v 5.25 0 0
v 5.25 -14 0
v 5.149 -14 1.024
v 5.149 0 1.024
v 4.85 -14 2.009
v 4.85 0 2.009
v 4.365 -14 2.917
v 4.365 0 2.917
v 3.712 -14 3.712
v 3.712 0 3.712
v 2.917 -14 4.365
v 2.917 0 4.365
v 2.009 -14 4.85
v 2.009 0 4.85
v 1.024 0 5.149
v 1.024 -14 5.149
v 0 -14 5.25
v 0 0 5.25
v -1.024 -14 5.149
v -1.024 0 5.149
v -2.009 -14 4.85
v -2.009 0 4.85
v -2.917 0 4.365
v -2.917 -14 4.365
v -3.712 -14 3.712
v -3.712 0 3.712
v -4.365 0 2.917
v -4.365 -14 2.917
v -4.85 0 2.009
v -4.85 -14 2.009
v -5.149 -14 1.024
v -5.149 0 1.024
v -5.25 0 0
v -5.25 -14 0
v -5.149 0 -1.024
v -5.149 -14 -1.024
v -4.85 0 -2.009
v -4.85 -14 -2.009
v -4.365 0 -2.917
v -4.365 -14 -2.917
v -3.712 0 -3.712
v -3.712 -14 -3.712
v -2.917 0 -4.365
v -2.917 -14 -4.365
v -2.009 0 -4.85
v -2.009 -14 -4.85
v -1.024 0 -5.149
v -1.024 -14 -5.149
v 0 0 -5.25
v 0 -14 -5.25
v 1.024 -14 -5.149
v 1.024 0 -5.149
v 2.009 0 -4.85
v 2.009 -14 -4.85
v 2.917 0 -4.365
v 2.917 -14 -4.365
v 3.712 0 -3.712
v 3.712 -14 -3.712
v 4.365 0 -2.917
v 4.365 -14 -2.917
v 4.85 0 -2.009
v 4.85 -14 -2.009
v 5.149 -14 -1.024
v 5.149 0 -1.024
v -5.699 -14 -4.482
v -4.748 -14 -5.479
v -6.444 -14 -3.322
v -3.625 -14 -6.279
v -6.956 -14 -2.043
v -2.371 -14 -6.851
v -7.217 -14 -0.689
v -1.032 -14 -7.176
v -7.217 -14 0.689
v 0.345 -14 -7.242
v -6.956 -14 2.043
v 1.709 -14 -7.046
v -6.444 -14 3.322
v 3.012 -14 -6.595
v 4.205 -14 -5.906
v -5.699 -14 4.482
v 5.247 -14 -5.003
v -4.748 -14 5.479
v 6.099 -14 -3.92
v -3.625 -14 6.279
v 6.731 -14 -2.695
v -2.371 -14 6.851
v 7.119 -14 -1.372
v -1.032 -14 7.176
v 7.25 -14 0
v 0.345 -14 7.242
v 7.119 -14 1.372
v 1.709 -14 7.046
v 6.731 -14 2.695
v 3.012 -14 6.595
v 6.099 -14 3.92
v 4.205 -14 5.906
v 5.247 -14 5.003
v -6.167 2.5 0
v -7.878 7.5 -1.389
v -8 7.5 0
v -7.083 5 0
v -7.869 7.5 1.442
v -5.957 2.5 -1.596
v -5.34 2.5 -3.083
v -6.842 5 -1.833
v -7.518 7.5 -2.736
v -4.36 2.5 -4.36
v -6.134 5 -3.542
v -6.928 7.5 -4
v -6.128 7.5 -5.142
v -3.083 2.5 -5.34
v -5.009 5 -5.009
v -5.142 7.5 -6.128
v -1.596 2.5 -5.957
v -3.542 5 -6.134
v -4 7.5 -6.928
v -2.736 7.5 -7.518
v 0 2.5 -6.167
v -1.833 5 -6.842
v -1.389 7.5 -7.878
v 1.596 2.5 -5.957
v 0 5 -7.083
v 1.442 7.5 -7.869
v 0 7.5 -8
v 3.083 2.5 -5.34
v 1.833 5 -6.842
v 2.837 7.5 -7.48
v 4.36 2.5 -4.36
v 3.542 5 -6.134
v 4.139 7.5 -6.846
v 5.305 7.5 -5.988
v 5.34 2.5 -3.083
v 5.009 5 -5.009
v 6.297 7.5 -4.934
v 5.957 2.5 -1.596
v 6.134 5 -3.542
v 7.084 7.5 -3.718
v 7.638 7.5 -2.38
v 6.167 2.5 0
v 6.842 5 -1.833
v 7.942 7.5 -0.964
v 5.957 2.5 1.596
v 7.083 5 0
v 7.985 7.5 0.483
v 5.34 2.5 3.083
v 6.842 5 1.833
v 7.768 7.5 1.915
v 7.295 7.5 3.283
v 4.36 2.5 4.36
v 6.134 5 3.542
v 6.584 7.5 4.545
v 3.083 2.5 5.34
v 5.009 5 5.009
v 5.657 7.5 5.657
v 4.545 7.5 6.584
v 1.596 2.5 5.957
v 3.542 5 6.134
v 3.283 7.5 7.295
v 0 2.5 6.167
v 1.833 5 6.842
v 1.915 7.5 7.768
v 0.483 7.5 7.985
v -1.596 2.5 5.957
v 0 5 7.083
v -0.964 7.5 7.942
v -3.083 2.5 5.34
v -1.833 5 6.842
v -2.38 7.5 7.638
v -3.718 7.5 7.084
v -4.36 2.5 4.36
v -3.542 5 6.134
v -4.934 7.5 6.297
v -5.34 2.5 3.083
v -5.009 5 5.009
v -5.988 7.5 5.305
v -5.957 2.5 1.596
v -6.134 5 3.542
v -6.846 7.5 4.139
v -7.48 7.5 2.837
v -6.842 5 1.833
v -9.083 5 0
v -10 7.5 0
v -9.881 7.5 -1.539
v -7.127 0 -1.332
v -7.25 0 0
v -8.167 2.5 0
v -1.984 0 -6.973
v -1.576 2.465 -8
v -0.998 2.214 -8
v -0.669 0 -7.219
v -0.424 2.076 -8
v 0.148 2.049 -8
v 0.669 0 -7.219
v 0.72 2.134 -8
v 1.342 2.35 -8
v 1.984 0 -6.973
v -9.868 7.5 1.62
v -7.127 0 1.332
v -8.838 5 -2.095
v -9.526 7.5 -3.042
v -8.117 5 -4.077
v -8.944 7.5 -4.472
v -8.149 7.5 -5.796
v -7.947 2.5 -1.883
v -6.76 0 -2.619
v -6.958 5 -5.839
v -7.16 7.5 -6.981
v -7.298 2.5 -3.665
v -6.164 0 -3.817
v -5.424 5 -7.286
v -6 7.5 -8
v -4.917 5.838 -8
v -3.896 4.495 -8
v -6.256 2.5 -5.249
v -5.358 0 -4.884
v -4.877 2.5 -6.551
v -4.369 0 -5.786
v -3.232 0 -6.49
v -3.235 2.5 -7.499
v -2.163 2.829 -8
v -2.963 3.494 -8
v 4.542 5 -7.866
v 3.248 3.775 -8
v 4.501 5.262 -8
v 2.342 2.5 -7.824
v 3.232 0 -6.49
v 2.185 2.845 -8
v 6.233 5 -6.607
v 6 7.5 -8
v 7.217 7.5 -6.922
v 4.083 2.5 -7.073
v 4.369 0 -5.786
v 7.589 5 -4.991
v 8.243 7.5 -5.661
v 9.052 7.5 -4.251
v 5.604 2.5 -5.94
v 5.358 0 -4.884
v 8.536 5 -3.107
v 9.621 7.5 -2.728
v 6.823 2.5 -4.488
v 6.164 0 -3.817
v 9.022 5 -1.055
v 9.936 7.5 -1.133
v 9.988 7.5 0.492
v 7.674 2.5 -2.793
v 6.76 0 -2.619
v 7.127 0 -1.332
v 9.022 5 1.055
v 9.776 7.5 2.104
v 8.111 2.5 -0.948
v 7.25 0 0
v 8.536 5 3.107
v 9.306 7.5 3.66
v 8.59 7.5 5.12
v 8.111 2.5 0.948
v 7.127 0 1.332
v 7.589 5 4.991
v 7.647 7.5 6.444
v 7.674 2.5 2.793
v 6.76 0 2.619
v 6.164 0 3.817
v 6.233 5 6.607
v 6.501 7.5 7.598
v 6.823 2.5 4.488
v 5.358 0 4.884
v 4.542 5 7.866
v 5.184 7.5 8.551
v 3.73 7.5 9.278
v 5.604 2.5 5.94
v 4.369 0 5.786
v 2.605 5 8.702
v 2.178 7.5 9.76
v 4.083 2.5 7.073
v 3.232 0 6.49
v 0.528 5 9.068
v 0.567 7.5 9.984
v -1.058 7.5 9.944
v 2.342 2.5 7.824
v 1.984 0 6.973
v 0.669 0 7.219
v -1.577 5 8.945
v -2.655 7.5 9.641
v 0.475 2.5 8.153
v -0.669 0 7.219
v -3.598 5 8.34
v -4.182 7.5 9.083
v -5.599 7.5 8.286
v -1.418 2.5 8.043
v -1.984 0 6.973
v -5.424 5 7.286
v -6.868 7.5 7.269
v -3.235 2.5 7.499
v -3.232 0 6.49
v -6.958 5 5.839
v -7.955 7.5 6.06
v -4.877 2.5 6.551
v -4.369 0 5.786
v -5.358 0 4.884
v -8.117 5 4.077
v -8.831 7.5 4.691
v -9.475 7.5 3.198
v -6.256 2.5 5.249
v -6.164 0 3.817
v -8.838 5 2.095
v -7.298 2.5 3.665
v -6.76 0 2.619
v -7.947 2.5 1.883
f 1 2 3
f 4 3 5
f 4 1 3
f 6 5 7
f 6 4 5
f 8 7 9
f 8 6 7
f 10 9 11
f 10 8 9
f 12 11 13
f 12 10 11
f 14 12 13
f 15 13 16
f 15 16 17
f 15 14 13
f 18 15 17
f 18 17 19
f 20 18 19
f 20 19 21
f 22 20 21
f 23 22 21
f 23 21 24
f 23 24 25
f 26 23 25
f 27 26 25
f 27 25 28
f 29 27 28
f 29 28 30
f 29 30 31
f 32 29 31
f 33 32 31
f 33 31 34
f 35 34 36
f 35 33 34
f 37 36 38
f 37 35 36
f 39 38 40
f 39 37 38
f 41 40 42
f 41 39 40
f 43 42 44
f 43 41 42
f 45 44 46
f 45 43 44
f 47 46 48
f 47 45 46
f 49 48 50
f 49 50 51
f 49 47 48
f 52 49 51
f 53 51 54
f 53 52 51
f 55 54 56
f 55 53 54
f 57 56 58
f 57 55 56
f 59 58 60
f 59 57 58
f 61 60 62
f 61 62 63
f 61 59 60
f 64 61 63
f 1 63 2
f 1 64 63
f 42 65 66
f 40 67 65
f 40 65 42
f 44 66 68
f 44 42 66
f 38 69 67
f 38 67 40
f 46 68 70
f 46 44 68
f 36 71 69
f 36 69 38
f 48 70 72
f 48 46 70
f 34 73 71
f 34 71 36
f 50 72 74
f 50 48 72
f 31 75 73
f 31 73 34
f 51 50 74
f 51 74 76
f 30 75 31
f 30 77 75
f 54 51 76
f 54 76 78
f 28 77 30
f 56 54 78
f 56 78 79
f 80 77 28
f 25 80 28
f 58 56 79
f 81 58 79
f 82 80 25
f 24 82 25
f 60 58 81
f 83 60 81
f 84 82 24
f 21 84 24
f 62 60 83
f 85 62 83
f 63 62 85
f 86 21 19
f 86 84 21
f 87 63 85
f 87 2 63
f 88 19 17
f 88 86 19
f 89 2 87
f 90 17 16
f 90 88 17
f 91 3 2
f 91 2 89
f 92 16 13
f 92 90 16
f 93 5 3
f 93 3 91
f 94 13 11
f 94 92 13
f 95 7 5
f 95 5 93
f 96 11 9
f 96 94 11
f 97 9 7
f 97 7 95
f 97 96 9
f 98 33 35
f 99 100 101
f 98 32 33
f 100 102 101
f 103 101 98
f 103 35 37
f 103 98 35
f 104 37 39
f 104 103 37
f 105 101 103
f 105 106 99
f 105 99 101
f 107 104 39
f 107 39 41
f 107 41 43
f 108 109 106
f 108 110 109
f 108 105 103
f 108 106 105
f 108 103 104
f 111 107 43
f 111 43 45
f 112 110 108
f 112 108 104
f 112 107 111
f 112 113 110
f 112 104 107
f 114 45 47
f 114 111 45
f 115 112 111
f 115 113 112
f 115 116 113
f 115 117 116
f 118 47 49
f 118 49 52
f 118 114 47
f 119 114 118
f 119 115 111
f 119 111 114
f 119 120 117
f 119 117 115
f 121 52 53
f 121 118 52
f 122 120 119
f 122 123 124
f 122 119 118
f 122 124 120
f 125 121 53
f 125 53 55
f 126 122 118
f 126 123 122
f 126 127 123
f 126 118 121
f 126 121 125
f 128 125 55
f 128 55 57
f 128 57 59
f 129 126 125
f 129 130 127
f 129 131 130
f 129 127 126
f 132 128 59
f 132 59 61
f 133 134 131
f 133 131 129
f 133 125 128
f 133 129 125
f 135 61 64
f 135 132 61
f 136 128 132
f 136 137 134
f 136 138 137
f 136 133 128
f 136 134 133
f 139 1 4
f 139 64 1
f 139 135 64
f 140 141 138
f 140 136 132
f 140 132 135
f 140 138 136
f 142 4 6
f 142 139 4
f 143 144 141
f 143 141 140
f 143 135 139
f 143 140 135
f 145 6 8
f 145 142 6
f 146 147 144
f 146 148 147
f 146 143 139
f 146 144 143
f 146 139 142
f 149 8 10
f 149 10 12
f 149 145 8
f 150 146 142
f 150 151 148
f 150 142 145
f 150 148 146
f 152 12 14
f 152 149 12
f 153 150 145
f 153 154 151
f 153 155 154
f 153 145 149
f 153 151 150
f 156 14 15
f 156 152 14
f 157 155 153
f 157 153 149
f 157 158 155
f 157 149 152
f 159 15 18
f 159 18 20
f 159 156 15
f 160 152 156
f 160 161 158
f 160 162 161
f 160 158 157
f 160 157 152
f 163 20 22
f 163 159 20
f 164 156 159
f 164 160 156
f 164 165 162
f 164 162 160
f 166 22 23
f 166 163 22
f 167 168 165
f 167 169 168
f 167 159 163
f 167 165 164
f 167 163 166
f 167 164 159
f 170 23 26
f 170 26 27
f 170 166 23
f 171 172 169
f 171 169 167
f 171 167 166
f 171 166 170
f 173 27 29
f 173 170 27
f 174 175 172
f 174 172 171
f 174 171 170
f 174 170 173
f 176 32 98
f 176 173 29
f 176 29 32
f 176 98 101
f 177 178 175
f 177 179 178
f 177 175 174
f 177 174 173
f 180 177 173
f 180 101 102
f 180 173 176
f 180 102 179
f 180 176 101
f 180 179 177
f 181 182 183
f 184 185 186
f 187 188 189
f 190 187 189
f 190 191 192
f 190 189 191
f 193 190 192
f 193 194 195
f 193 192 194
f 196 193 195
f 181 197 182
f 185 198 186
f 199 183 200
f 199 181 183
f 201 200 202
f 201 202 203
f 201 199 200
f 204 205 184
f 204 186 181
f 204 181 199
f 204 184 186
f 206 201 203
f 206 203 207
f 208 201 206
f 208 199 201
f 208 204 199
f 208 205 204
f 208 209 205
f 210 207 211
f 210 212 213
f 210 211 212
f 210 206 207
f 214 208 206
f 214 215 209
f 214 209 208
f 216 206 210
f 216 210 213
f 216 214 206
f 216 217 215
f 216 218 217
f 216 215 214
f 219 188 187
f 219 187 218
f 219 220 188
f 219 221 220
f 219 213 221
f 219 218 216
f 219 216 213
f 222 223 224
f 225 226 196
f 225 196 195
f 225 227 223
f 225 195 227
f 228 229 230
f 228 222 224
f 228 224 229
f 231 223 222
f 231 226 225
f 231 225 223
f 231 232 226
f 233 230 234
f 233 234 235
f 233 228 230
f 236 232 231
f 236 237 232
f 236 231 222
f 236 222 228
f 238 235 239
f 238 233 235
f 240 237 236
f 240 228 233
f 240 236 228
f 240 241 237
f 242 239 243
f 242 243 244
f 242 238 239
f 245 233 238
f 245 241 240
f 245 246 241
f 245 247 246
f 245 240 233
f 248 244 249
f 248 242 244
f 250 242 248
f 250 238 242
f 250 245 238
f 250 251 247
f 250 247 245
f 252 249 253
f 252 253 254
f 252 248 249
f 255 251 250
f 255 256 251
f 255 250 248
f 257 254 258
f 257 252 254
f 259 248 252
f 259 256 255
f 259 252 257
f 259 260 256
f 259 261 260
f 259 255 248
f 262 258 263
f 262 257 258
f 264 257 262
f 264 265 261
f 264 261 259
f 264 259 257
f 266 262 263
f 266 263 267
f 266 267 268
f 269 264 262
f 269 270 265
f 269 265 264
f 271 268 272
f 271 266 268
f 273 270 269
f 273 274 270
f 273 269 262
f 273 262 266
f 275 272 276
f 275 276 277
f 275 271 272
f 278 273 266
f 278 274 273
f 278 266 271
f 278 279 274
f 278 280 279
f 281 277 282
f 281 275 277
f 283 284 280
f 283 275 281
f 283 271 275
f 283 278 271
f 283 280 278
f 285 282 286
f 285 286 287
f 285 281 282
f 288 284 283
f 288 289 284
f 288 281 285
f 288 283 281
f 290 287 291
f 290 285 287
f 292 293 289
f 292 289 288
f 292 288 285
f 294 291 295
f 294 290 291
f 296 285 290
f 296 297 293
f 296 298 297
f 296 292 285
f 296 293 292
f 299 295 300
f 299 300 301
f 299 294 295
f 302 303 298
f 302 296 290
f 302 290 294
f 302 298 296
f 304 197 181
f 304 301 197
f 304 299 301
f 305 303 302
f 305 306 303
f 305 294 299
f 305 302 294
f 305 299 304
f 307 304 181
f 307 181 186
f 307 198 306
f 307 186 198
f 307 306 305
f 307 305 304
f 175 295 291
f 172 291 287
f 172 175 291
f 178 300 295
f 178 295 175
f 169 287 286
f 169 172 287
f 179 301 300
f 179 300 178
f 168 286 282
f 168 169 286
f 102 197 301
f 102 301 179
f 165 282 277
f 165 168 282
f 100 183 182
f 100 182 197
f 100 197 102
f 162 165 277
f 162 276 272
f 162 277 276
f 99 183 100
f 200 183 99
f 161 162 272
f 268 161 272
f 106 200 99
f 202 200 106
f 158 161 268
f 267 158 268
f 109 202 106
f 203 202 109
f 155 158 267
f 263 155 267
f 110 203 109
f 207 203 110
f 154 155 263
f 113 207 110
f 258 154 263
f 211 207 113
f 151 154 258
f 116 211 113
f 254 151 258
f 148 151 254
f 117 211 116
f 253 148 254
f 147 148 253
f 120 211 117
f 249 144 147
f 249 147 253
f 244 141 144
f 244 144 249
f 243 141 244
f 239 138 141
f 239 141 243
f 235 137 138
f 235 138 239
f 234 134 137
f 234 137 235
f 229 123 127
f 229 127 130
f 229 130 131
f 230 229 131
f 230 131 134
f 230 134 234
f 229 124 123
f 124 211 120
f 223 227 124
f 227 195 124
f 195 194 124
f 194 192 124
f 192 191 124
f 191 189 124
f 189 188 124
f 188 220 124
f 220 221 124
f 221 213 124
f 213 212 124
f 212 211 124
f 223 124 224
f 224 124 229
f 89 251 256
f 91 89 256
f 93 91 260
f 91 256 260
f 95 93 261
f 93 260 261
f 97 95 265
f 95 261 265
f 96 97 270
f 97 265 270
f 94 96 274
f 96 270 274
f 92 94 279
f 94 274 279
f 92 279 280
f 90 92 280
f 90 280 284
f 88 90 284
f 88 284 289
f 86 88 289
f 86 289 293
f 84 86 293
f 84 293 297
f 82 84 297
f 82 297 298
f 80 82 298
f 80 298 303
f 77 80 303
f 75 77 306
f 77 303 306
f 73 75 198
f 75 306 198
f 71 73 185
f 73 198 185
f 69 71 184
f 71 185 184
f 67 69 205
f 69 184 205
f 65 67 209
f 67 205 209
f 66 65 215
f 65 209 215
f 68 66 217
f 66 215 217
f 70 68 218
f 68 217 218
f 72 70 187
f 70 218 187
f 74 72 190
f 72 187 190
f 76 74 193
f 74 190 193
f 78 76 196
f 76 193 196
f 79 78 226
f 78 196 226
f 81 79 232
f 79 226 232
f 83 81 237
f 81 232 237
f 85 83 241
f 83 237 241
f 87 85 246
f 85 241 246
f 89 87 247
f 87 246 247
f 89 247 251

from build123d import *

# Parameters (mm, degrees)
CROQUIS3_R              = 7.25
CROQUIS3_R_2            = 5.25
SALIENTE_EXTRUIR1_DEPTH = 14
CROQUIS4_W              = 14.959615834
CROQUIS4_H              = 3.245468311
CORTAR_EXTRUIR1_DEPTH   = 10


with BuildPart() as part:
    # Croquis2 → Revolución1 (revolve)
    with BuildSketch(Plane.XY):
        Polygon((-5.25, 0), (-8, 7.5), (-10, 7.5), (-7.25, 0), align=None)
    revolve(axis=Axis((0, 7.5, 0), (0, -1, 0)))

    # Croquis3 → Saliente-Extruir1 (add)
    with BuildSketch(Plane.XZ):
        Circle(CROQUIS3_R)
        Circle(CROQUIS3_R_2, mode=Mode.SUBTRACT)
    extrude(amount=SALIENTE_EXTRUIR1_DEPTH)

    # Croquis4 → Cortar-Extruir1 (cut)
    with BuildSketch(Plane(origin=(0, 7.5, 0), x_dir=(1, 0, 0), z_dir=(0, 1, 0))):
        with Locations((0, 9.622734156)):
            Rectangle(CROQUIS4_W, CROQUIS4_H)
    extrude(amount=-CORTAR_EXTRUIR1_DEPTH, mode=Mode.SUBTRACT)


solid = part.part
